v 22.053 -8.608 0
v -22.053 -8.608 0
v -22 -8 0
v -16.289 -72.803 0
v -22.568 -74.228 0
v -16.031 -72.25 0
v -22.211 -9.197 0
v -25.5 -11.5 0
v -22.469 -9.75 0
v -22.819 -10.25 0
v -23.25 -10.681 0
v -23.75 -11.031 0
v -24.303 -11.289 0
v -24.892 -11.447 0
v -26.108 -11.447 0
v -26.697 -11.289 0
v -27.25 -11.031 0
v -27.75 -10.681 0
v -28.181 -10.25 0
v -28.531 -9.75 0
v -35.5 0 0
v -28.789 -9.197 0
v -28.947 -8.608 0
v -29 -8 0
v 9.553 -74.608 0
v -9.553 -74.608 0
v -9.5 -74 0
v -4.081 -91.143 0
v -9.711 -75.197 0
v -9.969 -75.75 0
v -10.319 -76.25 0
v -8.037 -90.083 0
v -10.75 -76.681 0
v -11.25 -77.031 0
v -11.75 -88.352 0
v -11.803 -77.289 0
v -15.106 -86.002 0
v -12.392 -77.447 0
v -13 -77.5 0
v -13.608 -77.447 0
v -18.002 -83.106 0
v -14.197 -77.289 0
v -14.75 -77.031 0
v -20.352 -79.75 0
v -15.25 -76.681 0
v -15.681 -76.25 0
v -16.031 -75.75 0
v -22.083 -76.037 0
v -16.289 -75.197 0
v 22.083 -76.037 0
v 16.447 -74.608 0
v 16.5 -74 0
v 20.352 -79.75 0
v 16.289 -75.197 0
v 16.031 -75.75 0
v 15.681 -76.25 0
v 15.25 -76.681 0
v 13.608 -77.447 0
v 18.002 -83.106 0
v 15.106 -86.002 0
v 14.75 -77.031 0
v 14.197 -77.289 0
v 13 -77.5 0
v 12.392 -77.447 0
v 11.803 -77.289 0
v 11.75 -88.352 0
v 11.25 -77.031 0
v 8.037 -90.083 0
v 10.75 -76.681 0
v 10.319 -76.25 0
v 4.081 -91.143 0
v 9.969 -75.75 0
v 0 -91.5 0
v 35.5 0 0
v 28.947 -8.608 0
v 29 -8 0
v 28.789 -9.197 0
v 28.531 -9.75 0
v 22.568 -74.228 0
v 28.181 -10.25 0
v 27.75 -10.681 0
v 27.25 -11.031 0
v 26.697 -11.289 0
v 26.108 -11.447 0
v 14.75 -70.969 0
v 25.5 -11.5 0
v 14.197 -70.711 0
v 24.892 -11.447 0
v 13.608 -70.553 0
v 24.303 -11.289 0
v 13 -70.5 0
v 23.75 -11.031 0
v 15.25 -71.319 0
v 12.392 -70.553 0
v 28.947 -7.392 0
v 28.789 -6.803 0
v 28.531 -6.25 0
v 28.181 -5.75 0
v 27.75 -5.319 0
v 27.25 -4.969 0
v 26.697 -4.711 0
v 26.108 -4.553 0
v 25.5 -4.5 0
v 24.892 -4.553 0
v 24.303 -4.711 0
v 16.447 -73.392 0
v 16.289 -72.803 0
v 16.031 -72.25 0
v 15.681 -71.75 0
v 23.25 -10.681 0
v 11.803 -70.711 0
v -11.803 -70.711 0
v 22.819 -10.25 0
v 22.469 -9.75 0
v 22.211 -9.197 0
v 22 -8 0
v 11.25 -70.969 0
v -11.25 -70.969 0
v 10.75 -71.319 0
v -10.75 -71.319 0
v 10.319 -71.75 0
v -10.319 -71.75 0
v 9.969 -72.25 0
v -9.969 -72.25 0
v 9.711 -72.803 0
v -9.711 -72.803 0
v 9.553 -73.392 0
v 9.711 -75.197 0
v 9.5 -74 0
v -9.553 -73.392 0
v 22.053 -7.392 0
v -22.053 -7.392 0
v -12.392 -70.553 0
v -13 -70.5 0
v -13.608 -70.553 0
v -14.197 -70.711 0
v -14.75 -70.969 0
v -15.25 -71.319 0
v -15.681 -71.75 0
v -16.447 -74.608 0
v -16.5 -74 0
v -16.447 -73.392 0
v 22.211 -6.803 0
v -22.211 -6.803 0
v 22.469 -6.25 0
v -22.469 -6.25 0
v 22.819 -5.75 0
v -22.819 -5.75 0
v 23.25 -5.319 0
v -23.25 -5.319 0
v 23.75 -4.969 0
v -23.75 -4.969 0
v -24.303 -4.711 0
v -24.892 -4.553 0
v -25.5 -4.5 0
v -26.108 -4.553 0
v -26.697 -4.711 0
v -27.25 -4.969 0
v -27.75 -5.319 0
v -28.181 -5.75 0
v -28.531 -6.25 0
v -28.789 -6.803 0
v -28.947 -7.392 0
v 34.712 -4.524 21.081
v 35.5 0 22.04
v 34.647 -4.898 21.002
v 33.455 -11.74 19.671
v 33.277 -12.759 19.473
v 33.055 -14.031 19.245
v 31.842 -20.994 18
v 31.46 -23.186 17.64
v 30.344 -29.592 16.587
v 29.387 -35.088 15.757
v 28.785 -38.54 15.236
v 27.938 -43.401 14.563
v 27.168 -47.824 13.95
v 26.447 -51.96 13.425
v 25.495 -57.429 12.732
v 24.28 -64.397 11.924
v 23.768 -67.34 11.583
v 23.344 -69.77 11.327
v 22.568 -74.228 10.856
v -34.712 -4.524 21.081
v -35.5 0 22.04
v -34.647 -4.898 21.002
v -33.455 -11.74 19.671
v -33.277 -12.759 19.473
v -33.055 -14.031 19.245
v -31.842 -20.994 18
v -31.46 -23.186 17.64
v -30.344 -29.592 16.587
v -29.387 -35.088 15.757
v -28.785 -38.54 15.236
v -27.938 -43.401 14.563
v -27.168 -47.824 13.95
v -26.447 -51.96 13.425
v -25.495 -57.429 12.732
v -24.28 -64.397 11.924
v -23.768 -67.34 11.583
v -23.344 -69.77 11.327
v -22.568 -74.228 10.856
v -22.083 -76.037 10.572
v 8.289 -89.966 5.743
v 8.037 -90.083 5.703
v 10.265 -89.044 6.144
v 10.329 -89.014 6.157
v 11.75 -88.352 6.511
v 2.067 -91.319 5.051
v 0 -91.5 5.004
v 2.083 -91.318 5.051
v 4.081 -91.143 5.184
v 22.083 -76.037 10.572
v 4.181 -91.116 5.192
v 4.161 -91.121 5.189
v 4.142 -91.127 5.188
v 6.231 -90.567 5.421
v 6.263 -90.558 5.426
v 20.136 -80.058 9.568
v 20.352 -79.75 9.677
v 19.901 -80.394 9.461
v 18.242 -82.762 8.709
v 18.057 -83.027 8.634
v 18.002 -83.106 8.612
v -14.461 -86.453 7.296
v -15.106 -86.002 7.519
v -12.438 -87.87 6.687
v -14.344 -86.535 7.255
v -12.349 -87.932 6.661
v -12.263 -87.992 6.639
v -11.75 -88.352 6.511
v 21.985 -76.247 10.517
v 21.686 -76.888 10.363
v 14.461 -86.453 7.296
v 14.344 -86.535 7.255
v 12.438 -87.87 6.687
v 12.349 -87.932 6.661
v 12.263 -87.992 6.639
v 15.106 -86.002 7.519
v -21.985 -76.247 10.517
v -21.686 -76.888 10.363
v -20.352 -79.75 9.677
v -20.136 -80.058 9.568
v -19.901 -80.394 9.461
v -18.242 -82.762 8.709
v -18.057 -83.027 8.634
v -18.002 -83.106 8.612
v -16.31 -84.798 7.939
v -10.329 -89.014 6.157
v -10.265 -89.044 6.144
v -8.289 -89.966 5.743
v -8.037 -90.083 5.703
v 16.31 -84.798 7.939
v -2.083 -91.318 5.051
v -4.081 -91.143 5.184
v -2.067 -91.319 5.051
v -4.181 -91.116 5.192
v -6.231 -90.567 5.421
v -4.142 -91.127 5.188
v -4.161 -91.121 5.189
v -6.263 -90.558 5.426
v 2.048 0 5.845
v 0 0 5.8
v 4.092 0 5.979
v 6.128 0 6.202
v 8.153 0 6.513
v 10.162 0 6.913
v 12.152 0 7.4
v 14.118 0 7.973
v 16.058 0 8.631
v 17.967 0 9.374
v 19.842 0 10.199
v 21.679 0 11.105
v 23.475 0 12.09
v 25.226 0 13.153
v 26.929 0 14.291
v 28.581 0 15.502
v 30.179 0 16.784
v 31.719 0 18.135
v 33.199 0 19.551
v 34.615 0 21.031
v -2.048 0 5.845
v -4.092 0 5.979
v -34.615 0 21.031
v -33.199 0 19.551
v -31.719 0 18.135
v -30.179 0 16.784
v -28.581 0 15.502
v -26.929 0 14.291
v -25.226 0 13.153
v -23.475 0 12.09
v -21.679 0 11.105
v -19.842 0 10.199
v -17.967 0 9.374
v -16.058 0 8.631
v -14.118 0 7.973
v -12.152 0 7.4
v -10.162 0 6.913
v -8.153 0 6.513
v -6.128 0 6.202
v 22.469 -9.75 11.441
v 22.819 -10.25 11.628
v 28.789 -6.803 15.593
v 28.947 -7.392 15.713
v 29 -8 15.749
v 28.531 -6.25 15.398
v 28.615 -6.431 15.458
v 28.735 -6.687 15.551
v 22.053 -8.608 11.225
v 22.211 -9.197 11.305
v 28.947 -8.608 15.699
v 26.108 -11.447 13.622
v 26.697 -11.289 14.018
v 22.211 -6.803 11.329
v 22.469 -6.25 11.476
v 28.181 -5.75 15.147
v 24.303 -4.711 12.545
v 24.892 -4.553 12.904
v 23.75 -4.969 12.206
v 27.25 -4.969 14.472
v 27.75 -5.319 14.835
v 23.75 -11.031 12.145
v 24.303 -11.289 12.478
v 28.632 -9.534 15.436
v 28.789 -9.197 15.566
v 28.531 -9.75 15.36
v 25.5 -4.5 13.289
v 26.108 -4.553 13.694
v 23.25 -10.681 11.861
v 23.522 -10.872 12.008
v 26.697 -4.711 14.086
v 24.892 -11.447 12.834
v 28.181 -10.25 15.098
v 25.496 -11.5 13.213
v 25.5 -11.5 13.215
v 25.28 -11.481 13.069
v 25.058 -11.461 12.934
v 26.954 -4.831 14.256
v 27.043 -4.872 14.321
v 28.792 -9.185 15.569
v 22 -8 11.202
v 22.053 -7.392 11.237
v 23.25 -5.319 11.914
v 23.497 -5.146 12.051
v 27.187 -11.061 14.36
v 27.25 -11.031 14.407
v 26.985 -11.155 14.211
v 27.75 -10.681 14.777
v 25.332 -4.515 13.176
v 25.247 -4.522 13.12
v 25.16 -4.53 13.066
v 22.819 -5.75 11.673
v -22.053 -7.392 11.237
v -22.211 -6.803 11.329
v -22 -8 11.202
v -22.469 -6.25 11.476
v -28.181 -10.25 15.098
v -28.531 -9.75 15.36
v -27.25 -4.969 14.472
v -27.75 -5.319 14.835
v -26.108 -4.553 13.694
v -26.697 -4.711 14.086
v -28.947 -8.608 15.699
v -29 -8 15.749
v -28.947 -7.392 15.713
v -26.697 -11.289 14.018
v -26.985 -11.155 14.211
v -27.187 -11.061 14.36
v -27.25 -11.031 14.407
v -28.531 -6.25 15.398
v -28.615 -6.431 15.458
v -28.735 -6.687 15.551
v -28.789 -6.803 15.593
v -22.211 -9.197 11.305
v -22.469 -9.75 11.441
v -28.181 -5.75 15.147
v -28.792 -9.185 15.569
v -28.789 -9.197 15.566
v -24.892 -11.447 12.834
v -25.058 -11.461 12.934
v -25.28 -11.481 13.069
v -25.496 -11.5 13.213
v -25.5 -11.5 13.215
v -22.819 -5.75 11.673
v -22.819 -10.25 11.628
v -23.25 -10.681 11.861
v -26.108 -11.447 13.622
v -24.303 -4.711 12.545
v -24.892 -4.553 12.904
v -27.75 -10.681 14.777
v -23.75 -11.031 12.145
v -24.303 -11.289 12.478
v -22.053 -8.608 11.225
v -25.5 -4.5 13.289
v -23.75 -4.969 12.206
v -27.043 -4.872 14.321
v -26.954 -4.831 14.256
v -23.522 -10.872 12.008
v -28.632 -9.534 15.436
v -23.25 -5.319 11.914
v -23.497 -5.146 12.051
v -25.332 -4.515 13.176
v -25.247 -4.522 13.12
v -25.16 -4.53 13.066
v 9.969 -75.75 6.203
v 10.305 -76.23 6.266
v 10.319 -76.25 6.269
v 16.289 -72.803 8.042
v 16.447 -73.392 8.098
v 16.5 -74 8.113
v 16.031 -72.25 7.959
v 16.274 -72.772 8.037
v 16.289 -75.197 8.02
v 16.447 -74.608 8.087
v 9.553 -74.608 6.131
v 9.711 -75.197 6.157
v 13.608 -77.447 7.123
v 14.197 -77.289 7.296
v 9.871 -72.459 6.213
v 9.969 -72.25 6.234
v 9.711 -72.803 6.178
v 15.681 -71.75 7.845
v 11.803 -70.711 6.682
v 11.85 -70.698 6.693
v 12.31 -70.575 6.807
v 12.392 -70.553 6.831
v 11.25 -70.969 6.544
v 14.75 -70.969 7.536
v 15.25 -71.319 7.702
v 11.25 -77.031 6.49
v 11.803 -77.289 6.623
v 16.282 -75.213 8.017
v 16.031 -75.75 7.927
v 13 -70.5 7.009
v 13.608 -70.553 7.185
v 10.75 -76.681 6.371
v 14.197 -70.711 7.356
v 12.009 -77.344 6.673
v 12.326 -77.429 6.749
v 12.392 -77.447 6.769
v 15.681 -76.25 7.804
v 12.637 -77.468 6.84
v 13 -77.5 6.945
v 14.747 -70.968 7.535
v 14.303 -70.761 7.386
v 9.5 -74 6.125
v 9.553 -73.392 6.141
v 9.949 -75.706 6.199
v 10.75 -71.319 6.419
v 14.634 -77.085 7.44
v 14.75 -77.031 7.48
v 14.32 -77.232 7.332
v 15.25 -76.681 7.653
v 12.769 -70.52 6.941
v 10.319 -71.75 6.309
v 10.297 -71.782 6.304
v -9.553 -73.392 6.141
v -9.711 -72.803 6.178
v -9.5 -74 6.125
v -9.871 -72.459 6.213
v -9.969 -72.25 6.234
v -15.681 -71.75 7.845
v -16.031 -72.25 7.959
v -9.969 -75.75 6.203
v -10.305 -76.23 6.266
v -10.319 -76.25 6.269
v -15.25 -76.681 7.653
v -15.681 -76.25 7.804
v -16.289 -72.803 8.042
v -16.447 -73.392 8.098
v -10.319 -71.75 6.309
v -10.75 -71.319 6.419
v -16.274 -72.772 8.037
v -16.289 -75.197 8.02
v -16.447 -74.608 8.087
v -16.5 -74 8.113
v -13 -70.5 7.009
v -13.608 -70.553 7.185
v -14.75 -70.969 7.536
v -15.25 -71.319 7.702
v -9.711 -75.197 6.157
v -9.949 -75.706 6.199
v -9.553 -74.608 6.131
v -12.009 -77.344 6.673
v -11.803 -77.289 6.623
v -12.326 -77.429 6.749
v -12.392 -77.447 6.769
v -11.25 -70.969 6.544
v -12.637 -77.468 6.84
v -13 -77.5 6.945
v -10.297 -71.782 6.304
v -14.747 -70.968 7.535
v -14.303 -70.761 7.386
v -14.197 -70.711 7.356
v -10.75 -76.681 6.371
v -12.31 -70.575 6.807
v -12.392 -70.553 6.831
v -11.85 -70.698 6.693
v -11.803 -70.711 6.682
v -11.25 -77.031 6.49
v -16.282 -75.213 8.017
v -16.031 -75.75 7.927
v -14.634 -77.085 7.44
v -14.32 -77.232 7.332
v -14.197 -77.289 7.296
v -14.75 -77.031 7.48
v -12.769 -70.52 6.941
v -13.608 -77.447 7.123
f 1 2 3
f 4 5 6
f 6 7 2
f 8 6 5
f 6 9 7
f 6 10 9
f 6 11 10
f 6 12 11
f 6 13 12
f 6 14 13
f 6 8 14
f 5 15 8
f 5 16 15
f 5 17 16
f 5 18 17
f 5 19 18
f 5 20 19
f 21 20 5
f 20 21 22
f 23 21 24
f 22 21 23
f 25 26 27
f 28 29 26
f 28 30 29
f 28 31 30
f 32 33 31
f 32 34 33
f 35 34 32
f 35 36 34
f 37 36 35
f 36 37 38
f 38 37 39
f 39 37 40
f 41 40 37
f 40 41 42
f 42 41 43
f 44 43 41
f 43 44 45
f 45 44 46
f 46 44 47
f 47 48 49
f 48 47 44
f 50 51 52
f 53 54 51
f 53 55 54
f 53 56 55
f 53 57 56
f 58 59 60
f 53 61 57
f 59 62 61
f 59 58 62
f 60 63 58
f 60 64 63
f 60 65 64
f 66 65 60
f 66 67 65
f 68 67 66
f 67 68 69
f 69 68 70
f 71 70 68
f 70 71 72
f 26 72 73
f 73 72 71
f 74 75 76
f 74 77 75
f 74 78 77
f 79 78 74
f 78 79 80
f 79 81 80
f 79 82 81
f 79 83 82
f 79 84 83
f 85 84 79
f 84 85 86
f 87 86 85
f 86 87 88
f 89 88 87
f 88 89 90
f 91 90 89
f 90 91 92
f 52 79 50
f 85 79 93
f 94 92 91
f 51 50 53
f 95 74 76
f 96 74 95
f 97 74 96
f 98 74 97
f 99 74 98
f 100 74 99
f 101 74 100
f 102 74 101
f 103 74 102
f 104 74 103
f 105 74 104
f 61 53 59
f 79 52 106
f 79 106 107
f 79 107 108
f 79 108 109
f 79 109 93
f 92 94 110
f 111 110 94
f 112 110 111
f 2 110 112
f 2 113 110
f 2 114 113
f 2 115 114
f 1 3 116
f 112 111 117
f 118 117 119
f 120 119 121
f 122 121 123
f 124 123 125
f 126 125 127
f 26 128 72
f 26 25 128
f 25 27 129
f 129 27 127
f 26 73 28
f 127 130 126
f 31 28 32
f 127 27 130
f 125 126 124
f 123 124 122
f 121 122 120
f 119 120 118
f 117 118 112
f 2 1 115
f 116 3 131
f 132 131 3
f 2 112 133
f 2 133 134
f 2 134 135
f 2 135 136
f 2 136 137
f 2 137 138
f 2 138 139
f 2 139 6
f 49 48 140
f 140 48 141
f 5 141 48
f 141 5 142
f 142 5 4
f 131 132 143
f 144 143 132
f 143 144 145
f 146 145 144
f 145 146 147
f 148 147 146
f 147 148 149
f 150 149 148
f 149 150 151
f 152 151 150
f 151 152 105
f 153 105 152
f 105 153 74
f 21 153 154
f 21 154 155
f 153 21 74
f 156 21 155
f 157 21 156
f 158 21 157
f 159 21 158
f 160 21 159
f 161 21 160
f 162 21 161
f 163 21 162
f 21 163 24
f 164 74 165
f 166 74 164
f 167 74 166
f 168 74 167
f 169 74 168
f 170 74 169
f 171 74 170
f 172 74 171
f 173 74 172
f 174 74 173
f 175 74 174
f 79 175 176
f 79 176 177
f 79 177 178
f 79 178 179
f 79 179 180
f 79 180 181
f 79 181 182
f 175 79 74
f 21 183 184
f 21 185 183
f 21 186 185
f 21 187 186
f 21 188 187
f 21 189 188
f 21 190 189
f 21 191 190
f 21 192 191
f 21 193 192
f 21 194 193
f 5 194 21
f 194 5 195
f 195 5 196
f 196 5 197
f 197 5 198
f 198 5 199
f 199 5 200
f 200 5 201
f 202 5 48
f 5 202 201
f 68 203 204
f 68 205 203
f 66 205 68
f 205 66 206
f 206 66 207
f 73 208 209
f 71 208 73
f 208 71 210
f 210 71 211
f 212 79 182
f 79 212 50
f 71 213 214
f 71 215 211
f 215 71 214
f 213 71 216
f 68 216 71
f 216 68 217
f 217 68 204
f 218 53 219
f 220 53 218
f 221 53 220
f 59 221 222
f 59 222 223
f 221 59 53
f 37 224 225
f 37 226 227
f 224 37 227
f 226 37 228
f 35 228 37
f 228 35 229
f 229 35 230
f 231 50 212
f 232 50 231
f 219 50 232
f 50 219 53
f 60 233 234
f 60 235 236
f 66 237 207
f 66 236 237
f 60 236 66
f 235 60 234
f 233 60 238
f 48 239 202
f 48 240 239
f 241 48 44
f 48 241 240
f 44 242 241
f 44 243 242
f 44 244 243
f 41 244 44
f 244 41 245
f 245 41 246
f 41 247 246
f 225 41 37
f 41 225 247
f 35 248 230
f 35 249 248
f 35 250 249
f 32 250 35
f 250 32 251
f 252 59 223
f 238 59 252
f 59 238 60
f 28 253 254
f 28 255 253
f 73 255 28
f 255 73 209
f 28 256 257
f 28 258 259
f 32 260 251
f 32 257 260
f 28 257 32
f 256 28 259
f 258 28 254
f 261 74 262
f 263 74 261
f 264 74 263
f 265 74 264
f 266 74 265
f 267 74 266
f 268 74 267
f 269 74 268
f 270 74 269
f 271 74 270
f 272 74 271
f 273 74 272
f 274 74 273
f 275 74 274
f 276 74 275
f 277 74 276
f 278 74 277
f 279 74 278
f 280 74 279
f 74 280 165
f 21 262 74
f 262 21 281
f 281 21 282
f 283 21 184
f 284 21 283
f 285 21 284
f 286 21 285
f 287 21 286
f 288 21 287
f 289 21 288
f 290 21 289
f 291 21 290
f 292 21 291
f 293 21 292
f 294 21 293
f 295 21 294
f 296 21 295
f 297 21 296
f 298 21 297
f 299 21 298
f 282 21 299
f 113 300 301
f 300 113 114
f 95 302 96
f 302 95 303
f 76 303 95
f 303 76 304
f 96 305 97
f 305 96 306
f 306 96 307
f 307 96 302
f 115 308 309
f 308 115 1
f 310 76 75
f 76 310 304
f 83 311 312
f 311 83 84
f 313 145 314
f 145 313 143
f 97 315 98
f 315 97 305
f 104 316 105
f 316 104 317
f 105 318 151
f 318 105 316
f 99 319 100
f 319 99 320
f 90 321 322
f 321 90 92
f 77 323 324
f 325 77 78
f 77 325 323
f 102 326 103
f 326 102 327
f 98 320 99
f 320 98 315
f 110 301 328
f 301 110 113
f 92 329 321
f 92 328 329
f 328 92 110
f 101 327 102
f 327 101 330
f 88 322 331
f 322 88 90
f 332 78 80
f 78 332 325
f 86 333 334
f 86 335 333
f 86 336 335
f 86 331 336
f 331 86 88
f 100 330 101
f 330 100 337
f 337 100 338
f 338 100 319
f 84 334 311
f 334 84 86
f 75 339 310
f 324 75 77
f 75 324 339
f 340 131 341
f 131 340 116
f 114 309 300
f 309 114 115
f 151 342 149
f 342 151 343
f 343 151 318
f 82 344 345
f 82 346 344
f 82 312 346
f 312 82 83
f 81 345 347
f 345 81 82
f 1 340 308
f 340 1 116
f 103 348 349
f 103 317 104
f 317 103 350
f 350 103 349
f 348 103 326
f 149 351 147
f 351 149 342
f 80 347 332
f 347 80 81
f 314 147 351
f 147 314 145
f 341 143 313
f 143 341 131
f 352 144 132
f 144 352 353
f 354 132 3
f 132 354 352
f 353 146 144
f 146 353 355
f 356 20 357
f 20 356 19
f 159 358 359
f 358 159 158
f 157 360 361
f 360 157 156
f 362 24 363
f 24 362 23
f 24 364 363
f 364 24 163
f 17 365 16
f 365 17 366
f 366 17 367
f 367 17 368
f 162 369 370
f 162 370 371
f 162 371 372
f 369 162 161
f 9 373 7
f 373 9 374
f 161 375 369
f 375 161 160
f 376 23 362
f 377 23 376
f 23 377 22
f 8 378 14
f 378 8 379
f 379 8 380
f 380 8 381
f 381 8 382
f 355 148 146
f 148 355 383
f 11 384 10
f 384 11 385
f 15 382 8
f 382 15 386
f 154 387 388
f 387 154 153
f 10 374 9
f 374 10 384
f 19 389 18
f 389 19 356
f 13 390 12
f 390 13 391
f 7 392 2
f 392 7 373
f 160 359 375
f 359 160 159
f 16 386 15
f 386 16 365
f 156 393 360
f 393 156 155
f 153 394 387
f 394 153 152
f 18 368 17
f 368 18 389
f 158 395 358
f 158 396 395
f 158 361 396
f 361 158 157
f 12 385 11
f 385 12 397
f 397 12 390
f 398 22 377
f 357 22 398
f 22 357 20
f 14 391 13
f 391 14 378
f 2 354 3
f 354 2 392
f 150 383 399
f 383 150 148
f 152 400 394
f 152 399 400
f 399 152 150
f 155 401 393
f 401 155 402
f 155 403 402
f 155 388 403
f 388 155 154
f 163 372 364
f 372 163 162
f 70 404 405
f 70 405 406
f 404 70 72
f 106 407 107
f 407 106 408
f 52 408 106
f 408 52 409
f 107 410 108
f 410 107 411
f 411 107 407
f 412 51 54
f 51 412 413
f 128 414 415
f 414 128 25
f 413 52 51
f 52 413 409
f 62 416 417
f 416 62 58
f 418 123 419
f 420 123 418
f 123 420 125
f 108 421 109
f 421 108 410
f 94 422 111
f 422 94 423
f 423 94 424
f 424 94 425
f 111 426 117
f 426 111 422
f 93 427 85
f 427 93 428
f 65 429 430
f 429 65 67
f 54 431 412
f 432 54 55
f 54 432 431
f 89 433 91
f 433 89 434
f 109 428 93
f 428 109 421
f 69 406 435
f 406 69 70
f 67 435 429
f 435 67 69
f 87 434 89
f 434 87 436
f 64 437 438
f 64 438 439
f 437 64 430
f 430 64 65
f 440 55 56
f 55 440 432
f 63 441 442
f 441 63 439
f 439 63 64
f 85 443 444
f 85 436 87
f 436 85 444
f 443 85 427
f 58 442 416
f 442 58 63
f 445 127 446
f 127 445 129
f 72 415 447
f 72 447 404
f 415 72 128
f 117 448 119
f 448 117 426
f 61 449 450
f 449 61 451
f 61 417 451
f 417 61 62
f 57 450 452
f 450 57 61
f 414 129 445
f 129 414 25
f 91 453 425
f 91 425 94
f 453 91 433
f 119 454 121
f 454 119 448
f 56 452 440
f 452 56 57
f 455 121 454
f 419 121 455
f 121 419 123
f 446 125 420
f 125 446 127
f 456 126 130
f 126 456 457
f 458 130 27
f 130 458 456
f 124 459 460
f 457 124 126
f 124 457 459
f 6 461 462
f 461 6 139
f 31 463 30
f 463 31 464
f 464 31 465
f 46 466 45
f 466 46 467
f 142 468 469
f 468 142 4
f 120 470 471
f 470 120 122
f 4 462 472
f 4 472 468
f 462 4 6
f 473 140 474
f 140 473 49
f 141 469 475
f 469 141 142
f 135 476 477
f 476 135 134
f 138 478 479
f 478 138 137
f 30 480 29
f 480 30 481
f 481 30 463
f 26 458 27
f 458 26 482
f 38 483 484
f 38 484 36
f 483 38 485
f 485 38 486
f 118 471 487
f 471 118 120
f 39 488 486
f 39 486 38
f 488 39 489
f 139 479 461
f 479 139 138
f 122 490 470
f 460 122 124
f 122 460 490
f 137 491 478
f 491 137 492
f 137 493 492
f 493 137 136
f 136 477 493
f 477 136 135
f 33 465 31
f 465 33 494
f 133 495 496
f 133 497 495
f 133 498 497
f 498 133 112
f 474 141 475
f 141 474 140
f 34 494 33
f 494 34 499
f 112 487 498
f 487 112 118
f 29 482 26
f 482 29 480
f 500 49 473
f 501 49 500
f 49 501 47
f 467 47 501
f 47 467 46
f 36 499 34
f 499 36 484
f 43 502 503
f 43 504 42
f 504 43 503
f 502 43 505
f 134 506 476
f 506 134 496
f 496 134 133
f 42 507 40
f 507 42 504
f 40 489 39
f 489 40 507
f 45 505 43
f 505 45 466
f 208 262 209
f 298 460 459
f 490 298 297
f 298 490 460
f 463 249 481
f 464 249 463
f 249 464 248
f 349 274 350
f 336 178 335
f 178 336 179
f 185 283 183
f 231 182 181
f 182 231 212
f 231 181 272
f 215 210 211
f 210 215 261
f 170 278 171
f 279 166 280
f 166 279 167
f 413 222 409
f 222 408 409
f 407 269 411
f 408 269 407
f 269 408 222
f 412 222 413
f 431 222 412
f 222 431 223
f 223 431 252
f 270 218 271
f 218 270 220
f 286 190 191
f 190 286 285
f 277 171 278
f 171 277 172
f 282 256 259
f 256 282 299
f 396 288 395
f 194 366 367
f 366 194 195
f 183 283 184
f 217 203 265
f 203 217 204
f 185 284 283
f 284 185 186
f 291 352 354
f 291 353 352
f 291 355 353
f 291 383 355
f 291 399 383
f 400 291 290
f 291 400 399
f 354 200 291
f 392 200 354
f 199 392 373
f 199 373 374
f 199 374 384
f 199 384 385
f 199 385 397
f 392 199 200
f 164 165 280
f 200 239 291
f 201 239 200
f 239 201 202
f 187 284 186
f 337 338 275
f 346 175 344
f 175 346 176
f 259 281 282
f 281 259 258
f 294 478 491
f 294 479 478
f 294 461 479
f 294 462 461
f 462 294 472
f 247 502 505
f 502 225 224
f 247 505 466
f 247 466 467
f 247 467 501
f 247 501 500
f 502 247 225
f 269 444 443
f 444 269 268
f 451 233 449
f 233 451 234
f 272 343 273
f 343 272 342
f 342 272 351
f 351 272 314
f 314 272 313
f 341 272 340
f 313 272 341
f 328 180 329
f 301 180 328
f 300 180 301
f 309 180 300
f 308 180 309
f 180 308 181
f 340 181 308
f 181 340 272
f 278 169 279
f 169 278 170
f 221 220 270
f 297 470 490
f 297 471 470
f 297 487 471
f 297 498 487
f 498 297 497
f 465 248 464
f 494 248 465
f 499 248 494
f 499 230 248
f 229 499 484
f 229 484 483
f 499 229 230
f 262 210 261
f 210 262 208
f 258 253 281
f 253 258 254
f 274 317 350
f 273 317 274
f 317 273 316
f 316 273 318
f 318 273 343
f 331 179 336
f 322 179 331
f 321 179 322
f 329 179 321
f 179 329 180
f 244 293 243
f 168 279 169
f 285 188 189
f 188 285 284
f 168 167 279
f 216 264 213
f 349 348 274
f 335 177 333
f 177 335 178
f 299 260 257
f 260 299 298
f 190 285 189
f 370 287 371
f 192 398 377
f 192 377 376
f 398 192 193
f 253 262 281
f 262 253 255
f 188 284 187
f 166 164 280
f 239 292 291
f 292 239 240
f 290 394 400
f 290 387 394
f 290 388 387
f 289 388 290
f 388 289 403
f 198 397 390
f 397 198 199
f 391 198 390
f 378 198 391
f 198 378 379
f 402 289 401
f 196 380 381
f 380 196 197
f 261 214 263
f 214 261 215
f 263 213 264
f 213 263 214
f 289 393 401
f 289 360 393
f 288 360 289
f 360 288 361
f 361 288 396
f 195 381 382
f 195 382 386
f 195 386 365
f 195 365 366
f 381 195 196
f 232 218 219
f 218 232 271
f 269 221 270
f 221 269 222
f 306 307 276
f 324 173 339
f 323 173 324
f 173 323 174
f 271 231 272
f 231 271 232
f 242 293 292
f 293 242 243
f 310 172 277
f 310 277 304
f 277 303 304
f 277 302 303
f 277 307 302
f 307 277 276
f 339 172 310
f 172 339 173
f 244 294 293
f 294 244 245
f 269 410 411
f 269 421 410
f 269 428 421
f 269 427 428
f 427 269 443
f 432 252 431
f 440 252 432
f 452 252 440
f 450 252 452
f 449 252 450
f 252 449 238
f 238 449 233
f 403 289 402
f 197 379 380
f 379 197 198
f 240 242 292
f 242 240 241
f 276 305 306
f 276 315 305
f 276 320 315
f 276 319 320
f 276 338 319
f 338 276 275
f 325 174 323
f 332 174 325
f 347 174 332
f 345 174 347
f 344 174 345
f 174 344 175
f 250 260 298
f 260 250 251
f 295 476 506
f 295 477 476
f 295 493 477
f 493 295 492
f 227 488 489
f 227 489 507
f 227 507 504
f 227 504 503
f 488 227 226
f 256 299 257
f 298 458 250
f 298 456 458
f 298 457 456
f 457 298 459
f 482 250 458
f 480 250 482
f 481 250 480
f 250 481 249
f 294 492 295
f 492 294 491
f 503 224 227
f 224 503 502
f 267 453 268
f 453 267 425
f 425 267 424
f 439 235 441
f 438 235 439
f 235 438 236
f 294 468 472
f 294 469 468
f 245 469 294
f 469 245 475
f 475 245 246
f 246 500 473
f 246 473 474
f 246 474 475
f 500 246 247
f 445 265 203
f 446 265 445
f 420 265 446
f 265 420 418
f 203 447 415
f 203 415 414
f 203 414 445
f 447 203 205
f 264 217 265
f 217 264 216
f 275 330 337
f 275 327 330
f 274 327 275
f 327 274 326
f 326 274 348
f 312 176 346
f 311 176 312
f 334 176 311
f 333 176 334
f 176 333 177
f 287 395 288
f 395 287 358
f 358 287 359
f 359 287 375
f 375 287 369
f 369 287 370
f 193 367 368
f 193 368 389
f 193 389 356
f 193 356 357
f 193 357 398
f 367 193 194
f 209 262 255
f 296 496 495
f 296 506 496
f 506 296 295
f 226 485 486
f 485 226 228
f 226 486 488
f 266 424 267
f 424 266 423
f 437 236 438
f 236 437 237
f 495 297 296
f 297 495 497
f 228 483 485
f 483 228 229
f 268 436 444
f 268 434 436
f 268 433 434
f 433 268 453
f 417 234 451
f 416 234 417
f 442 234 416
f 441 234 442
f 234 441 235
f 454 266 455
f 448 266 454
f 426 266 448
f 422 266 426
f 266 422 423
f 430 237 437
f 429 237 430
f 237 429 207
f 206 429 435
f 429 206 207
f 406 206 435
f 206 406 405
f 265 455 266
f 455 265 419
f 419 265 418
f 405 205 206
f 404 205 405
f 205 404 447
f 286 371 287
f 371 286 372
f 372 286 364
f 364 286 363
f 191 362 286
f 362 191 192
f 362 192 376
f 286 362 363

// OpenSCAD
$fn = 36;

base   = 71;
height = 203.76;
thick  = 50;

thickbuffer = 5;

length = 92;

ax = -base/2;
ay = 0;

bx = base/2;
by = 0;

cx = 0;
cy = -height;


holed = 7;

// top set of holes
thx = 25.5;
thy = -8;

// bottom set of holes
bhx = 13;
bhy = -74;

arcy = 68;
arcr = 23.5;

// post dimensions - almost, but not quite, a simple cylinder
posttop = 93.9;
postbot = 95.5;

difference(){
    polyhedron( points = [[ax, ay, 0],
                          [bx, by, 0],
                          [cx, cy, 0],
                          [ax, ay, thick],
                          [bx, by, thick],
                          [cx, cy, thick]],
                faces = [[1, 0, 2],    // back
                         [3, 0, 1, 4], // top
                         [3, 5, 2, 0], // left side
                         [2, 5, 4, 1], // right side
                         [4, 5, 3]]     // front
                         );
    
    translate([thx,thy,0]){
        cylinder(h = 2*thick, d = 7, center = true);
    }
    
    translate([-thx,thy,0]){
        cylinder(h = 2*thick, d = 7, center = true);
    }
    
    translate([bhx,bhy,0]){
        cylinder(h = 2*thick, d = 7, center = true);
    }
    
    translate([-bhx,bhy,0]){
        cylinder(h = 2*thick, d = 7, center = true);
    }
    
    tip();
    
    translate([0,-0.5*length, (postbot/2) + thickbuffer]){
        rotate([90,0,0]){
            #cylinder(h = length, d2 = postbot, d1 = posttop, center = true, $fn=144);
        }
    }
    
}




module tip(){
    difference() {     
        polyhedron( points = [[ax, ay, 0],
                              [bx, by, 0],
                              [cx, cy, 0],
                              [ax, ay, thick],
                              [bx, by, thick],
                              [cx, cy, thick]],
                    faces = [[1, 0, 2],    // back
                             [3, 0, 1, 4], // top
                             [3, 5, 2, 0], // left side
                             [2, 5, 4, 1], // right side
                             [4, 5, 3]]     // front
                             );
        translate([0, -0.5*arcy, 0.5*thick]){
            cube([base, arcy+7.75, thick], center = true);
        }
        translate([0, -arcy, 0.5*thick]){
            cylinder(r = arcr, h = thick, center = true);
        }
    }
}
